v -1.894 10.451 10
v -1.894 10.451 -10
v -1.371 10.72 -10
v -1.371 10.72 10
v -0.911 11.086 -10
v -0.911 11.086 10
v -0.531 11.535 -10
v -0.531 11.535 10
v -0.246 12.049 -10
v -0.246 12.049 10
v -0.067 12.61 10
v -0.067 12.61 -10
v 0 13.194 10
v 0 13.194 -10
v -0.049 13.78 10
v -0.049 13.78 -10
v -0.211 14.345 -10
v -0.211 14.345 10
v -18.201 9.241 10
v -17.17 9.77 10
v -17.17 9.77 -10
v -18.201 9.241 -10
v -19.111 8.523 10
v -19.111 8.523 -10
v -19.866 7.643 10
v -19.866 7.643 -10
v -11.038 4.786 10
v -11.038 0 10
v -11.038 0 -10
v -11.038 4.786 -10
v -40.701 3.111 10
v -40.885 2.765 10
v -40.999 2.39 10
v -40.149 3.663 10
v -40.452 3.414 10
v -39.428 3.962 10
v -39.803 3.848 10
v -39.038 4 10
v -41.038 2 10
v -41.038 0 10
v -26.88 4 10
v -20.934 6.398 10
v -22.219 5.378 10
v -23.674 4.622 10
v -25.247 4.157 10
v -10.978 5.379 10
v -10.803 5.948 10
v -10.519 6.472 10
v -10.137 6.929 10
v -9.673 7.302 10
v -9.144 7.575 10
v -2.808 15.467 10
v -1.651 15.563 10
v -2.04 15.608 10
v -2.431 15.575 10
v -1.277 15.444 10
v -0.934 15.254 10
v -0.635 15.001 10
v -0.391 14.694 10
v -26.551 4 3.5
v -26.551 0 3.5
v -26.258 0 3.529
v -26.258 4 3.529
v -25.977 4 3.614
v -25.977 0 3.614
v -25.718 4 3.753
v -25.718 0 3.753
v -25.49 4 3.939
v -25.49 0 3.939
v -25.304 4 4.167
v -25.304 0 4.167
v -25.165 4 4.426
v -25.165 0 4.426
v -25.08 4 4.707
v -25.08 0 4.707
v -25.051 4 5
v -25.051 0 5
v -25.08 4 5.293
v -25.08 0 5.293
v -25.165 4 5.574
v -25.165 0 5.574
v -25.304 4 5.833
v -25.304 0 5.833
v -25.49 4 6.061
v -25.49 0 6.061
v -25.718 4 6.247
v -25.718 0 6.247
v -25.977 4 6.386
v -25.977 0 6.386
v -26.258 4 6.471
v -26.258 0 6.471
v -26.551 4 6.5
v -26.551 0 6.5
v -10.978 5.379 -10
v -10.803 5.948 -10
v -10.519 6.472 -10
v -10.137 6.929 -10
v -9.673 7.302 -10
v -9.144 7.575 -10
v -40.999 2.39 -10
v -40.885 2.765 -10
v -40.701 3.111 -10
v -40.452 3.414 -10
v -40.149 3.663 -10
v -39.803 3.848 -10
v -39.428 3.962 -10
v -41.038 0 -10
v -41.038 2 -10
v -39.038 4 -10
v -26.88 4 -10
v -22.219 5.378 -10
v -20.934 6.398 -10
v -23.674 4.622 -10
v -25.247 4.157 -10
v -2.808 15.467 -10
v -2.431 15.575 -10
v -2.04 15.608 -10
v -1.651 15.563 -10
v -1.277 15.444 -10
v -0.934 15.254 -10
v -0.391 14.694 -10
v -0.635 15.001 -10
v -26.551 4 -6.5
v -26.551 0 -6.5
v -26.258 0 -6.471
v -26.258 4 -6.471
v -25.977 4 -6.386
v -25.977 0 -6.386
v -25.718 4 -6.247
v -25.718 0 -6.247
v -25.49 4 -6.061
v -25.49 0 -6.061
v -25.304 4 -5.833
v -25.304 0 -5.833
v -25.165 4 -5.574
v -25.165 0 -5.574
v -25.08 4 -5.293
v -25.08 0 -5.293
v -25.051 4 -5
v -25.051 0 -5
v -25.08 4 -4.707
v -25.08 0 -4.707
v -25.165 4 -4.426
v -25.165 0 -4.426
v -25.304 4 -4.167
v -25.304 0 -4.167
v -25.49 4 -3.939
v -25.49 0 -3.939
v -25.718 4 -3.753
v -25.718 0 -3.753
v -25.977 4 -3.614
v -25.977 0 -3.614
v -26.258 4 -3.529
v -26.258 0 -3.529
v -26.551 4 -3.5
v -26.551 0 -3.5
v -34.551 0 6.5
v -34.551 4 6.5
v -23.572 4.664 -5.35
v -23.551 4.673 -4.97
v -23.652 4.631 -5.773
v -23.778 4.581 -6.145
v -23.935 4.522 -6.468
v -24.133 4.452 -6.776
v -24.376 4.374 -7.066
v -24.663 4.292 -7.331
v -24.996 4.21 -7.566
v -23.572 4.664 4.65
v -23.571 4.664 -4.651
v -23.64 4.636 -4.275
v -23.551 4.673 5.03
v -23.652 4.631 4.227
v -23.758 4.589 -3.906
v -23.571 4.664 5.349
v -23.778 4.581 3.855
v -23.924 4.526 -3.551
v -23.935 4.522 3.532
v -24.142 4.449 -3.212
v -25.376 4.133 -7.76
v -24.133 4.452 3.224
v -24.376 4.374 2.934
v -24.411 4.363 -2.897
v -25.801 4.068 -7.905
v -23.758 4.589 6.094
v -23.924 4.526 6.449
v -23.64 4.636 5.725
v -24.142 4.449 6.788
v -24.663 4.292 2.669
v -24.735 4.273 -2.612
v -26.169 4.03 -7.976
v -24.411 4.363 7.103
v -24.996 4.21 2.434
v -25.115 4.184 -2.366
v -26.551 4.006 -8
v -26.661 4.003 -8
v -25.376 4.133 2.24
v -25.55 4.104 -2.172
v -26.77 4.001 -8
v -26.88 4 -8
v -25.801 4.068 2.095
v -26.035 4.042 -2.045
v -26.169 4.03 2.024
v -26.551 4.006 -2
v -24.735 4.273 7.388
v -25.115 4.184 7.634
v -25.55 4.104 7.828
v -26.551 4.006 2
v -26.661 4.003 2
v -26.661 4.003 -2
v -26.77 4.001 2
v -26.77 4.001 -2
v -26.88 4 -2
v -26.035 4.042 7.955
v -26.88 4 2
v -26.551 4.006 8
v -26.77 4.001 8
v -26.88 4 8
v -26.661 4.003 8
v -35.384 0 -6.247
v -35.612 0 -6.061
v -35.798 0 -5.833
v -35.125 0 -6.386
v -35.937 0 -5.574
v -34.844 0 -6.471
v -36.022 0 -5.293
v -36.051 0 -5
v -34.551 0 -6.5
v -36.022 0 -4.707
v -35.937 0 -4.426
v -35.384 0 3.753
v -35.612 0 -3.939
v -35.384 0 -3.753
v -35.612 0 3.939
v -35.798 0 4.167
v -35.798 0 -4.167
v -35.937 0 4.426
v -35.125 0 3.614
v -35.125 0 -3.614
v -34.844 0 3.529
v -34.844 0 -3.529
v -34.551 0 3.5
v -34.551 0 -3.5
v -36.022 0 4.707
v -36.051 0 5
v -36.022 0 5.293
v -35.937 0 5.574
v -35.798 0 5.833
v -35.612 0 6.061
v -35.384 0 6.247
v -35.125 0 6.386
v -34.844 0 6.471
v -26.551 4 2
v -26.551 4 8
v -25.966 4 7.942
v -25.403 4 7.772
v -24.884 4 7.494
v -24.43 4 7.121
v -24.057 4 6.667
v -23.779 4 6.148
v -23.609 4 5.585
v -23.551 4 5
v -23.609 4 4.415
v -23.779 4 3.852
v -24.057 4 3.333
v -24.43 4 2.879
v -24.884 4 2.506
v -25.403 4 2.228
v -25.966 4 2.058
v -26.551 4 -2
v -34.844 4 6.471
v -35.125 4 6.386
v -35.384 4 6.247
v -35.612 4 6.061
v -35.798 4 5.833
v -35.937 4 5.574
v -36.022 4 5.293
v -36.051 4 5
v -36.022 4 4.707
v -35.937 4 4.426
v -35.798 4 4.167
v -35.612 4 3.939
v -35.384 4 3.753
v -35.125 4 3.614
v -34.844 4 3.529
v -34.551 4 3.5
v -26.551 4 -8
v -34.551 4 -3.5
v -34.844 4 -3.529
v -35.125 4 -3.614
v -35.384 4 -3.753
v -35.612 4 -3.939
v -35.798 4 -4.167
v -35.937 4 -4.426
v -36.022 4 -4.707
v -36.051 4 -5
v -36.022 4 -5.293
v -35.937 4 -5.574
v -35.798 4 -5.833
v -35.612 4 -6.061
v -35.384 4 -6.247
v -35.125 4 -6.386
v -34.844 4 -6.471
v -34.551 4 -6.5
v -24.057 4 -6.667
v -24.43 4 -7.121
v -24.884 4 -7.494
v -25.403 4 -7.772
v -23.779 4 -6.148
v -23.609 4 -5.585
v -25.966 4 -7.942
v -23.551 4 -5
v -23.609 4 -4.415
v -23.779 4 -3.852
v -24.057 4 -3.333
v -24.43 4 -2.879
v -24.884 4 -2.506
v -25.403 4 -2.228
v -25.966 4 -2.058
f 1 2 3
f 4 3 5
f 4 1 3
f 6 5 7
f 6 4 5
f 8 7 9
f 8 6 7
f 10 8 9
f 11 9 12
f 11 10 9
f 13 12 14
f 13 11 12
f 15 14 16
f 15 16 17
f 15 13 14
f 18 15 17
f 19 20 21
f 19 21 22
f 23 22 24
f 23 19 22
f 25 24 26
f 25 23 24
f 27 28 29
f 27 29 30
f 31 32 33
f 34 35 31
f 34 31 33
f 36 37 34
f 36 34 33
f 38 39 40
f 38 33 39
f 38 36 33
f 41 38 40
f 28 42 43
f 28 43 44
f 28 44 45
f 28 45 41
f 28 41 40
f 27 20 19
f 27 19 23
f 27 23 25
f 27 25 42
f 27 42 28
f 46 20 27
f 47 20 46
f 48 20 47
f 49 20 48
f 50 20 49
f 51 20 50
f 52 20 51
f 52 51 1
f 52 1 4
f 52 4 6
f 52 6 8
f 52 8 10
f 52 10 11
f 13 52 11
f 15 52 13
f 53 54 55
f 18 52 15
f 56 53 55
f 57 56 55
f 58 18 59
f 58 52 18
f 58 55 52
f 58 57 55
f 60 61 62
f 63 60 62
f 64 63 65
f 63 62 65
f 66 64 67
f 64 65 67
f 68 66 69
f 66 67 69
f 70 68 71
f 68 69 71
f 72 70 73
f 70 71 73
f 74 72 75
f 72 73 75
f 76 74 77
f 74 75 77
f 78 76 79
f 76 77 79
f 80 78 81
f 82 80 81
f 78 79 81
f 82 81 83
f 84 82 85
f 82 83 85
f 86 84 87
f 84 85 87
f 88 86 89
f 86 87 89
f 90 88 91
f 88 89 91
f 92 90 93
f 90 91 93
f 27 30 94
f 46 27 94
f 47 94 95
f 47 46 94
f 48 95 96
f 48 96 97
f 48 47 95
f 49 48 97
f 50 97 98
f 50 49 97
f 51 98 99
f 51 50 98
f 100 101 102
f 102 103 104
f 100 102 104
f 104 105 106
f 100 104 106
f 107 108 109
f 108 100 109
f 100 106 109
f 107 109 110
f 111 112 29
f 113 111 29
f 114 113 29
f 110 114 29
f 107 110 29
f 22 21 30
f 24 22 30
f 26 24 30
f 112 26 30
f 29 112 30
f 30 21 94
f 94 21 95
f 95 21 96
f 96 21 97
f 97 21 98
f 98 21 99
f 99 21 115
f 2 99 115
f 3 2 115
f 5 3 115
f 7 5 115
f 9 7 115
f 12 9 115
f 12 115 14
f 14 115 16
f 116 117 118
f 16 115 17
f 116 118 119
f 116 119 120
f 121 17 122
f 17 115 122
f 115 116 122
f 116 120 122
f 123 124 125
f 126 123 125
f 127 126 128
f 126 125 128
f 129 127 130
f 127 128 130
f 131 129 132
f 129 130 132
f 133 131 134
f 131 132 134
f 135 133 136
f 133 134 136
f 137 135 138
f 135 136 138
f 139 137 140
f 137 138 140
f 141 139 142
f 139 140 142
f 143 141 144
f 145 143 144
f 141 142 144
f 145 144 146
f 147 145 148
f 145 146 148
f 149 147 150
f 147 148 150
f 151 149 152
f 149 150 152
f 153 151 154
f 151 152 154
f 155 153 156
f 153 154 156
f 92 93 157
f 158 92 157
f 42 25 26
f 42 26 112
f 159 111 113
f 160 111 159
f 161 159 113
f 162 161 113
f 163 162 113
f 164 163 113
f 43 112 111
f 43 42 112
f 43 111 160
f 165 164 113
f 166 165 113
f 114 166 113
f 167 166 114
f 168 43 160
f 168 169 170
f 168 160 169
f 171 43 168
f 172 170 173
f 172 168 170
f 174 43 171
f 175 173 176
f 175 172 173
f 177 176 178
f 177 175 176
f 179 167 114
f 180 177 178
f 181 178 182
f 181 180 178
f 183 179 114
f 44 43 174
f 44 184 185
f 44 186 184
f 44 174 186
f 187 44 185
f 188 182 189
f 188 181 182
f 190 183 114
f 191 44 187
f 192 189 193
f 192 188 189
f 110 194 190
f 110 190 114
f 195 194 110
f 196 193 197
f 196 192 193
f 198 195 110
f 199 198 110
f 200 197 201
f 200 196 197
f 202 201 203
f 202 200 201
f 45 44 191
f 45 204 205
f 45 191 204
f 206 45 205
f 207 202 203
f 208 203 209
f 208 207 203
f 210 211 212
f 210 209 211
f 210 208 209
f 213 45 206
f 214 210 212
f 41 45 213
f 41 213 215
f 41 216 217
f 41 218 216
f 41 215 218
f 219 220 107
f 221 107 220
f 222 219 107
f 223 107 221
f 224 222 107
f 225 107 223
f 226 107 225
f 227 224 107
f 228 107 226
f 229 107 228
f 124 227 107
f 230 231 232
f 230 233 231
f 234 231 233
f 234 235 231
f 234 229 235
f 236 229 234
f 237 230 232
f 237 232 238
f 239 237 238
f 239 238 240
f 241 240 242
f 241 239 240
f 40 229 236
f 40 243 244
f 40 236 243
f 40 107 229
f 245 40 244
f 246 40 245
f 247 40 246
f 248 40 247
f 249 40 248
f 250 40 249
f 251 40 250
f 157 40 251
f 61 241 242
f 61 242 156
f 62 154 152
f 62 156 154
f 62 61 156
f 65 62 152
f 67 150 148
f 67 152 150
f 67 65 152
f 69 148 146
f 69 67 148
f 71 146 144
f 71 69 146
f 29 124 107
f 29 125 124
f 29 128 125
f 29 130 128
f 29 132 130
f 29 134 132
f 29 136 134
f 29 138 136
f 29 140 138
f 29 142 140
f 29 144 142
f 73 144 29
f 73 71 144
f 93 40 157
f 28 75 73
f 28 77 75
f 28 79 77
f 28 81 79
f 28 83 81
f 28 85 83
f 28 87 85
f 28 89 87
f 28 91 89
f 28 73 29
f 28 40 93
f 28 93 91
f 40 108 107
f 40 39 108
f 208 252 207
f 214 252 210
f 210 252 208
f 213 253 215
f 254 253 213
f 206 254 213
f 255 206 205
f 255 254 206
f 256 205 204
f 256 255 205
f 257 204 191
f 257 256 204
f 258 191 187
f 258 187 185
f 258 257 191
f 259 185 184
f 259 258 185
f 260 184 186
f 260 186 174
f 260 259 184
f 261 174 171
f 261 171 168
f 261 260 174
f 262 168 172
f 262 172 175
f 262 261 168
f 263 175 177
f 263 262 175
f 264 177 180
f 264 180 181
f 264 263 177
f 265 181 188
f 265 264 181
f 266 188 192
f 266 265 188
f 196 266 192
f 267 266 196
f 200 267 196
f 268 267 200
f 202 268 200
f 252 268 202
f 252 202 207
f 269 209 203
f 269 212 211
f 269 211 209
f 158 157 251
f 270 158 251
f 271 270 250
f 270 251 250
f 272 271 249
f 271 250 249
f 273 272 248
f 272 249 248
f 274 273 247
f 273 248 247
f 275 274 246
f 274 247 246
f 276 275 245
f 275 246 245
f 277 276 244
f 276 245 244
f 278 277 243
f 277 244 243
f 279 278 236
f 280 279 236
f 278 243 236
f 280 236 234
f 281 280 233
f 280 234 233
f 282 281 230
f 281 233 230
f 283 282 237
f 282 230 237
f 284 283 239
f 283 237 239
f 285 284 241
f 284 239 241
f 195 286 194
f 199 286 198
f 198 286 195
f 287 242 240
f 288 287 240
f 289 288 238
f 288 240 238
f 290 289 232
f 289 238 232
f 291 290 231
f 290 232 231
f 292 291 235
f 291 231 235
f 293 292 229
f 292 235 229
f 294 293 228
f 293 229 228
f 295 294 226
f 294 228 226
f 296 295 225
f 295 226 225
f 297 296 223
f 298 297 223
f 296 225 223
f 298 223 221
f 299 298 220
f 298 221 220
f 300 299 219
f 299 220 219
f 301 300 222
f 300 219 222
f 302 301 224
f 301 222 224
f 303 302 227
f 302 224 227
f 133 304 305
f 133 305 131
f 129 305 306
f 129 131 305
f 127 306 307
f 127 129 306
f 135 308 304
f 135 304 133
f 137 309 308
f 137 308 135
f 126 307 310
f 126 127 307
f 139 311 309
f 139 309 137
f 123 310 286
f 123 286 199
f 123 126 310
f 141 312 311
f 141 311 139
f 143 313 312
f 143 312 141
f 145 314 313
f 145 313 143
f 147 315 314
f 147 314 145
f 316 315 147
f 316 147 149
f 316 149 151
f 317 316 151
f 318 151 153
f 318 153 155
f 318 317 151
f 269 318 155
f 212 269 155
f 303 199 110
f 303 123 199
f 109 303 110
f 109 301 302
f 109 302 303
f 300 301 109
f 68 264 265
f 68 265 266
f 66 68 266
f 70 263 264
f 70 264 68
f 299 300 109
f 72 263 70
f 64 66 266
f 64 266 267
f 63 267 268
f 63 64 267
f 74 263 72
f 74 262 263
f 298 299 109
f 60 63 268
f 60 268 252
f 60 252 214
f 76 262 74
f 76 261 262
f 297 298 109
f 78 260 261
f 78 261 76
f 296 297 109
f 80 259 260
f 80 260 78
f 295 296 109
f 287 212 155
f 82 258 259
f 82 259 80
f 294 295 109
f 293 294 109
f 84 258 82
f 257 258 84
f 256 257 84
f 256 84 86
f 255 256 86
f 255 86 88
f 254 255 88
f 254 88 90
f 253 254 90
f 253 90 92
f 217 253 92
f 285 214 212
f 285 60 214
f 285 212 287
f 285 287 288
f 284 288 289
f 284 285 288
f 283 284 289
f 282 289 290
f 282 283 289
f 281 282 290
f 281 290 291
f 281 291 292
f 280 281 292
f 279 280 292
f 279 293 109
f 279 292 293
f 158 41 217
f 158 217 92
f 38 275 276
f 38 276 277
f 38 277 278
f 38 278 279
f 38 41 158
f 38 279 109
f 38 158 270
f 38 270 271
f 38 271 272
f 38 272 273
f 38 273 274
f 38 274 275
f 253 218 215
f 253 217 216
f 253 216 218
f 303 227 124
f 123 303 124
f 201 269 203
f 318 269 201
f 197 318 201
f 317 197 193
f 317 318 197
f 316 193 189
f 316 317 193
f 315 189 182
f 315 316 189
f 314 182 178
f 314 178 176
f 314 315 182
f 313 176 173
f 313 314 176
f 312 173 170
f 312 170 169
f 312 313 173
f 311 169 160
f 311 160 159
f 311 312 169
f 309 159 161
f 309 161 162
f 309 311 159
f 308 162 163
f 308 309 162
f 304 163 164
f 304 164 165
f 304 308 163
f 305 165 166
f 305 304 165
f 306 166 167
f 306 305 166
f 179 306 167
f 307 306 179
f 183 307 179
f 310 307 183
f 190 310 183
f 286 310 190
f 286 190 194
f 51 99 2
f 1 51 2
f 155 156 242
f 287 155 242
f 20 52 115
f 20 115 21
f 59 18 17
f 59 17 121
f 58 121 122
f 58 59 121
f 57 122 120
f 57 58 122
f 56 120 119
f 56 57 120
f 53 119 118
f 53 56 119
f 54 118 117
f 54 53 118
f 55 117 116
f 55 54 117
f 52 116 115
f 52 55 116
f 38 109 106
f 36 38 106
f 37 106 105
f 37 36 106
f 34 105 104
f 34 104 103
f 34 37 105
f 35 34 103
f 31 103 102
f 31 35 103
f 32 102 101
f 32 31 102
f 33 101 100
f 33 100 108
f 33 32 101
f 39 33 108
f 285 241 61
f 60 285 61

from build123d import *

# Parameters (mm, degrees)
F2_DEPTH = 10
F4_DEPTH = 25
F6_DEPTH = 25


with BuildPart() as f2:
    # F1 (on Top) → F2 (new body, symmetric)
    with BuildSketch(Plane.XY):
        with BuildLine():
            Line((-41.03757, 2), (-41.03757, 0))
            Line((-41.03757, 0), (-11.03757, 0))
            Line((-11.03757, 0), (-11.03757, 4.786366))
            ThreePointArc((-11.03757, 4.786366), (-10.519333, 6.471849), (-9.143667, 7.575012))
            Line((-9.143667, 7.575012), (-1.893904, 10.450577))
            ThreePointArc((-1.893904, 10.450577), (-0.246001, 12.049481), (-0.211353, 14.34532))
            ThreePointArc((-0.211353, 14.34532), (-1.277289, 15.443922), (-2.807848, 15.467021))
            Line((-2.807848, 15.467021), (-17.169758, 9.770475))
            ThreePointArc((-17.169758, 9.770475), (-18.673587, 8.903934), (-19.866468, 7.643207))
            ThreePointArc((-19.866468, 7.643207), (-22.928298, 4.965132), (-26.879931, 4))
            Line((-26.879931, 4), (-39.03757, 4))
            ThreePointArc((-39.03757, 4), (-40.451784, 3.414214), (-41.03757, 2))
        make_face()
    extrude(amount=F2_DEPTH, both=True)

    # F3 (on Front) → F4 (cut)
    with BuildSketch(Plane.XZ):
        with BuildLine():
            ThreePointArc((-34.551002, 6.5), (-36.051002, 5), (-34.551002, 3.5))
            Line((-34.551002, 3.5), (-26.551002, 3.5))
            ThreePointArc((-26.551002, 3.5), (-25.051002, 5), (-26.551002, 6.5))
            Line((-26.551002, 6.5), (-34.551002, 6.5))
        make_face()
        with BuildLine():
            ThreePointArc((-34.551002, -3.5), (-36.051002, -5), (-34.551002, -6.5))
            Line((-34.551002, -6.5), (-26.551002, -6.5))
            ThreePointArc((-26.551002, -6.5), (-25.051002, -5), (-26.551002, -3.5))
            Line((-26.551002, -3.5), (-34.551002, -3.5))
        make_face()
    extrude(amount=-F4_DEPTH, mode=Mode.SUBTRACT)

    # F5 (on face) → F6 (cut)
    with BuildSketch(Plane(origin=(0, 4, 0), x_dir=(-1, 0, 0), z_dir=(0, 1, 0))):
        with BuildLine():
            Line((30.551002, -2), (26.551002, -2))
            ThreePointArc((26.551002, -2), (23.551002, -5), (26.551002, -8))
            Line((26.551002, -8), (30.551002, -8))
            Line((30.551002, -8), (30.551002, -2))
        make_face()
        with BuildLine():
            Line((30.551002, 8), (26.551002, 8))
            ThreePointArc((26.551002, 8), (23.551002, 5), (26.551002, 2))
            Line((26.551002, 2), (30.551002, 2))
            Line((30.551002, 2), (30.551002, 8))
        make_face()
    extrude(amount=F6_DEPTH, mode=Mode.SUBTRACT)


solid = f2.part
